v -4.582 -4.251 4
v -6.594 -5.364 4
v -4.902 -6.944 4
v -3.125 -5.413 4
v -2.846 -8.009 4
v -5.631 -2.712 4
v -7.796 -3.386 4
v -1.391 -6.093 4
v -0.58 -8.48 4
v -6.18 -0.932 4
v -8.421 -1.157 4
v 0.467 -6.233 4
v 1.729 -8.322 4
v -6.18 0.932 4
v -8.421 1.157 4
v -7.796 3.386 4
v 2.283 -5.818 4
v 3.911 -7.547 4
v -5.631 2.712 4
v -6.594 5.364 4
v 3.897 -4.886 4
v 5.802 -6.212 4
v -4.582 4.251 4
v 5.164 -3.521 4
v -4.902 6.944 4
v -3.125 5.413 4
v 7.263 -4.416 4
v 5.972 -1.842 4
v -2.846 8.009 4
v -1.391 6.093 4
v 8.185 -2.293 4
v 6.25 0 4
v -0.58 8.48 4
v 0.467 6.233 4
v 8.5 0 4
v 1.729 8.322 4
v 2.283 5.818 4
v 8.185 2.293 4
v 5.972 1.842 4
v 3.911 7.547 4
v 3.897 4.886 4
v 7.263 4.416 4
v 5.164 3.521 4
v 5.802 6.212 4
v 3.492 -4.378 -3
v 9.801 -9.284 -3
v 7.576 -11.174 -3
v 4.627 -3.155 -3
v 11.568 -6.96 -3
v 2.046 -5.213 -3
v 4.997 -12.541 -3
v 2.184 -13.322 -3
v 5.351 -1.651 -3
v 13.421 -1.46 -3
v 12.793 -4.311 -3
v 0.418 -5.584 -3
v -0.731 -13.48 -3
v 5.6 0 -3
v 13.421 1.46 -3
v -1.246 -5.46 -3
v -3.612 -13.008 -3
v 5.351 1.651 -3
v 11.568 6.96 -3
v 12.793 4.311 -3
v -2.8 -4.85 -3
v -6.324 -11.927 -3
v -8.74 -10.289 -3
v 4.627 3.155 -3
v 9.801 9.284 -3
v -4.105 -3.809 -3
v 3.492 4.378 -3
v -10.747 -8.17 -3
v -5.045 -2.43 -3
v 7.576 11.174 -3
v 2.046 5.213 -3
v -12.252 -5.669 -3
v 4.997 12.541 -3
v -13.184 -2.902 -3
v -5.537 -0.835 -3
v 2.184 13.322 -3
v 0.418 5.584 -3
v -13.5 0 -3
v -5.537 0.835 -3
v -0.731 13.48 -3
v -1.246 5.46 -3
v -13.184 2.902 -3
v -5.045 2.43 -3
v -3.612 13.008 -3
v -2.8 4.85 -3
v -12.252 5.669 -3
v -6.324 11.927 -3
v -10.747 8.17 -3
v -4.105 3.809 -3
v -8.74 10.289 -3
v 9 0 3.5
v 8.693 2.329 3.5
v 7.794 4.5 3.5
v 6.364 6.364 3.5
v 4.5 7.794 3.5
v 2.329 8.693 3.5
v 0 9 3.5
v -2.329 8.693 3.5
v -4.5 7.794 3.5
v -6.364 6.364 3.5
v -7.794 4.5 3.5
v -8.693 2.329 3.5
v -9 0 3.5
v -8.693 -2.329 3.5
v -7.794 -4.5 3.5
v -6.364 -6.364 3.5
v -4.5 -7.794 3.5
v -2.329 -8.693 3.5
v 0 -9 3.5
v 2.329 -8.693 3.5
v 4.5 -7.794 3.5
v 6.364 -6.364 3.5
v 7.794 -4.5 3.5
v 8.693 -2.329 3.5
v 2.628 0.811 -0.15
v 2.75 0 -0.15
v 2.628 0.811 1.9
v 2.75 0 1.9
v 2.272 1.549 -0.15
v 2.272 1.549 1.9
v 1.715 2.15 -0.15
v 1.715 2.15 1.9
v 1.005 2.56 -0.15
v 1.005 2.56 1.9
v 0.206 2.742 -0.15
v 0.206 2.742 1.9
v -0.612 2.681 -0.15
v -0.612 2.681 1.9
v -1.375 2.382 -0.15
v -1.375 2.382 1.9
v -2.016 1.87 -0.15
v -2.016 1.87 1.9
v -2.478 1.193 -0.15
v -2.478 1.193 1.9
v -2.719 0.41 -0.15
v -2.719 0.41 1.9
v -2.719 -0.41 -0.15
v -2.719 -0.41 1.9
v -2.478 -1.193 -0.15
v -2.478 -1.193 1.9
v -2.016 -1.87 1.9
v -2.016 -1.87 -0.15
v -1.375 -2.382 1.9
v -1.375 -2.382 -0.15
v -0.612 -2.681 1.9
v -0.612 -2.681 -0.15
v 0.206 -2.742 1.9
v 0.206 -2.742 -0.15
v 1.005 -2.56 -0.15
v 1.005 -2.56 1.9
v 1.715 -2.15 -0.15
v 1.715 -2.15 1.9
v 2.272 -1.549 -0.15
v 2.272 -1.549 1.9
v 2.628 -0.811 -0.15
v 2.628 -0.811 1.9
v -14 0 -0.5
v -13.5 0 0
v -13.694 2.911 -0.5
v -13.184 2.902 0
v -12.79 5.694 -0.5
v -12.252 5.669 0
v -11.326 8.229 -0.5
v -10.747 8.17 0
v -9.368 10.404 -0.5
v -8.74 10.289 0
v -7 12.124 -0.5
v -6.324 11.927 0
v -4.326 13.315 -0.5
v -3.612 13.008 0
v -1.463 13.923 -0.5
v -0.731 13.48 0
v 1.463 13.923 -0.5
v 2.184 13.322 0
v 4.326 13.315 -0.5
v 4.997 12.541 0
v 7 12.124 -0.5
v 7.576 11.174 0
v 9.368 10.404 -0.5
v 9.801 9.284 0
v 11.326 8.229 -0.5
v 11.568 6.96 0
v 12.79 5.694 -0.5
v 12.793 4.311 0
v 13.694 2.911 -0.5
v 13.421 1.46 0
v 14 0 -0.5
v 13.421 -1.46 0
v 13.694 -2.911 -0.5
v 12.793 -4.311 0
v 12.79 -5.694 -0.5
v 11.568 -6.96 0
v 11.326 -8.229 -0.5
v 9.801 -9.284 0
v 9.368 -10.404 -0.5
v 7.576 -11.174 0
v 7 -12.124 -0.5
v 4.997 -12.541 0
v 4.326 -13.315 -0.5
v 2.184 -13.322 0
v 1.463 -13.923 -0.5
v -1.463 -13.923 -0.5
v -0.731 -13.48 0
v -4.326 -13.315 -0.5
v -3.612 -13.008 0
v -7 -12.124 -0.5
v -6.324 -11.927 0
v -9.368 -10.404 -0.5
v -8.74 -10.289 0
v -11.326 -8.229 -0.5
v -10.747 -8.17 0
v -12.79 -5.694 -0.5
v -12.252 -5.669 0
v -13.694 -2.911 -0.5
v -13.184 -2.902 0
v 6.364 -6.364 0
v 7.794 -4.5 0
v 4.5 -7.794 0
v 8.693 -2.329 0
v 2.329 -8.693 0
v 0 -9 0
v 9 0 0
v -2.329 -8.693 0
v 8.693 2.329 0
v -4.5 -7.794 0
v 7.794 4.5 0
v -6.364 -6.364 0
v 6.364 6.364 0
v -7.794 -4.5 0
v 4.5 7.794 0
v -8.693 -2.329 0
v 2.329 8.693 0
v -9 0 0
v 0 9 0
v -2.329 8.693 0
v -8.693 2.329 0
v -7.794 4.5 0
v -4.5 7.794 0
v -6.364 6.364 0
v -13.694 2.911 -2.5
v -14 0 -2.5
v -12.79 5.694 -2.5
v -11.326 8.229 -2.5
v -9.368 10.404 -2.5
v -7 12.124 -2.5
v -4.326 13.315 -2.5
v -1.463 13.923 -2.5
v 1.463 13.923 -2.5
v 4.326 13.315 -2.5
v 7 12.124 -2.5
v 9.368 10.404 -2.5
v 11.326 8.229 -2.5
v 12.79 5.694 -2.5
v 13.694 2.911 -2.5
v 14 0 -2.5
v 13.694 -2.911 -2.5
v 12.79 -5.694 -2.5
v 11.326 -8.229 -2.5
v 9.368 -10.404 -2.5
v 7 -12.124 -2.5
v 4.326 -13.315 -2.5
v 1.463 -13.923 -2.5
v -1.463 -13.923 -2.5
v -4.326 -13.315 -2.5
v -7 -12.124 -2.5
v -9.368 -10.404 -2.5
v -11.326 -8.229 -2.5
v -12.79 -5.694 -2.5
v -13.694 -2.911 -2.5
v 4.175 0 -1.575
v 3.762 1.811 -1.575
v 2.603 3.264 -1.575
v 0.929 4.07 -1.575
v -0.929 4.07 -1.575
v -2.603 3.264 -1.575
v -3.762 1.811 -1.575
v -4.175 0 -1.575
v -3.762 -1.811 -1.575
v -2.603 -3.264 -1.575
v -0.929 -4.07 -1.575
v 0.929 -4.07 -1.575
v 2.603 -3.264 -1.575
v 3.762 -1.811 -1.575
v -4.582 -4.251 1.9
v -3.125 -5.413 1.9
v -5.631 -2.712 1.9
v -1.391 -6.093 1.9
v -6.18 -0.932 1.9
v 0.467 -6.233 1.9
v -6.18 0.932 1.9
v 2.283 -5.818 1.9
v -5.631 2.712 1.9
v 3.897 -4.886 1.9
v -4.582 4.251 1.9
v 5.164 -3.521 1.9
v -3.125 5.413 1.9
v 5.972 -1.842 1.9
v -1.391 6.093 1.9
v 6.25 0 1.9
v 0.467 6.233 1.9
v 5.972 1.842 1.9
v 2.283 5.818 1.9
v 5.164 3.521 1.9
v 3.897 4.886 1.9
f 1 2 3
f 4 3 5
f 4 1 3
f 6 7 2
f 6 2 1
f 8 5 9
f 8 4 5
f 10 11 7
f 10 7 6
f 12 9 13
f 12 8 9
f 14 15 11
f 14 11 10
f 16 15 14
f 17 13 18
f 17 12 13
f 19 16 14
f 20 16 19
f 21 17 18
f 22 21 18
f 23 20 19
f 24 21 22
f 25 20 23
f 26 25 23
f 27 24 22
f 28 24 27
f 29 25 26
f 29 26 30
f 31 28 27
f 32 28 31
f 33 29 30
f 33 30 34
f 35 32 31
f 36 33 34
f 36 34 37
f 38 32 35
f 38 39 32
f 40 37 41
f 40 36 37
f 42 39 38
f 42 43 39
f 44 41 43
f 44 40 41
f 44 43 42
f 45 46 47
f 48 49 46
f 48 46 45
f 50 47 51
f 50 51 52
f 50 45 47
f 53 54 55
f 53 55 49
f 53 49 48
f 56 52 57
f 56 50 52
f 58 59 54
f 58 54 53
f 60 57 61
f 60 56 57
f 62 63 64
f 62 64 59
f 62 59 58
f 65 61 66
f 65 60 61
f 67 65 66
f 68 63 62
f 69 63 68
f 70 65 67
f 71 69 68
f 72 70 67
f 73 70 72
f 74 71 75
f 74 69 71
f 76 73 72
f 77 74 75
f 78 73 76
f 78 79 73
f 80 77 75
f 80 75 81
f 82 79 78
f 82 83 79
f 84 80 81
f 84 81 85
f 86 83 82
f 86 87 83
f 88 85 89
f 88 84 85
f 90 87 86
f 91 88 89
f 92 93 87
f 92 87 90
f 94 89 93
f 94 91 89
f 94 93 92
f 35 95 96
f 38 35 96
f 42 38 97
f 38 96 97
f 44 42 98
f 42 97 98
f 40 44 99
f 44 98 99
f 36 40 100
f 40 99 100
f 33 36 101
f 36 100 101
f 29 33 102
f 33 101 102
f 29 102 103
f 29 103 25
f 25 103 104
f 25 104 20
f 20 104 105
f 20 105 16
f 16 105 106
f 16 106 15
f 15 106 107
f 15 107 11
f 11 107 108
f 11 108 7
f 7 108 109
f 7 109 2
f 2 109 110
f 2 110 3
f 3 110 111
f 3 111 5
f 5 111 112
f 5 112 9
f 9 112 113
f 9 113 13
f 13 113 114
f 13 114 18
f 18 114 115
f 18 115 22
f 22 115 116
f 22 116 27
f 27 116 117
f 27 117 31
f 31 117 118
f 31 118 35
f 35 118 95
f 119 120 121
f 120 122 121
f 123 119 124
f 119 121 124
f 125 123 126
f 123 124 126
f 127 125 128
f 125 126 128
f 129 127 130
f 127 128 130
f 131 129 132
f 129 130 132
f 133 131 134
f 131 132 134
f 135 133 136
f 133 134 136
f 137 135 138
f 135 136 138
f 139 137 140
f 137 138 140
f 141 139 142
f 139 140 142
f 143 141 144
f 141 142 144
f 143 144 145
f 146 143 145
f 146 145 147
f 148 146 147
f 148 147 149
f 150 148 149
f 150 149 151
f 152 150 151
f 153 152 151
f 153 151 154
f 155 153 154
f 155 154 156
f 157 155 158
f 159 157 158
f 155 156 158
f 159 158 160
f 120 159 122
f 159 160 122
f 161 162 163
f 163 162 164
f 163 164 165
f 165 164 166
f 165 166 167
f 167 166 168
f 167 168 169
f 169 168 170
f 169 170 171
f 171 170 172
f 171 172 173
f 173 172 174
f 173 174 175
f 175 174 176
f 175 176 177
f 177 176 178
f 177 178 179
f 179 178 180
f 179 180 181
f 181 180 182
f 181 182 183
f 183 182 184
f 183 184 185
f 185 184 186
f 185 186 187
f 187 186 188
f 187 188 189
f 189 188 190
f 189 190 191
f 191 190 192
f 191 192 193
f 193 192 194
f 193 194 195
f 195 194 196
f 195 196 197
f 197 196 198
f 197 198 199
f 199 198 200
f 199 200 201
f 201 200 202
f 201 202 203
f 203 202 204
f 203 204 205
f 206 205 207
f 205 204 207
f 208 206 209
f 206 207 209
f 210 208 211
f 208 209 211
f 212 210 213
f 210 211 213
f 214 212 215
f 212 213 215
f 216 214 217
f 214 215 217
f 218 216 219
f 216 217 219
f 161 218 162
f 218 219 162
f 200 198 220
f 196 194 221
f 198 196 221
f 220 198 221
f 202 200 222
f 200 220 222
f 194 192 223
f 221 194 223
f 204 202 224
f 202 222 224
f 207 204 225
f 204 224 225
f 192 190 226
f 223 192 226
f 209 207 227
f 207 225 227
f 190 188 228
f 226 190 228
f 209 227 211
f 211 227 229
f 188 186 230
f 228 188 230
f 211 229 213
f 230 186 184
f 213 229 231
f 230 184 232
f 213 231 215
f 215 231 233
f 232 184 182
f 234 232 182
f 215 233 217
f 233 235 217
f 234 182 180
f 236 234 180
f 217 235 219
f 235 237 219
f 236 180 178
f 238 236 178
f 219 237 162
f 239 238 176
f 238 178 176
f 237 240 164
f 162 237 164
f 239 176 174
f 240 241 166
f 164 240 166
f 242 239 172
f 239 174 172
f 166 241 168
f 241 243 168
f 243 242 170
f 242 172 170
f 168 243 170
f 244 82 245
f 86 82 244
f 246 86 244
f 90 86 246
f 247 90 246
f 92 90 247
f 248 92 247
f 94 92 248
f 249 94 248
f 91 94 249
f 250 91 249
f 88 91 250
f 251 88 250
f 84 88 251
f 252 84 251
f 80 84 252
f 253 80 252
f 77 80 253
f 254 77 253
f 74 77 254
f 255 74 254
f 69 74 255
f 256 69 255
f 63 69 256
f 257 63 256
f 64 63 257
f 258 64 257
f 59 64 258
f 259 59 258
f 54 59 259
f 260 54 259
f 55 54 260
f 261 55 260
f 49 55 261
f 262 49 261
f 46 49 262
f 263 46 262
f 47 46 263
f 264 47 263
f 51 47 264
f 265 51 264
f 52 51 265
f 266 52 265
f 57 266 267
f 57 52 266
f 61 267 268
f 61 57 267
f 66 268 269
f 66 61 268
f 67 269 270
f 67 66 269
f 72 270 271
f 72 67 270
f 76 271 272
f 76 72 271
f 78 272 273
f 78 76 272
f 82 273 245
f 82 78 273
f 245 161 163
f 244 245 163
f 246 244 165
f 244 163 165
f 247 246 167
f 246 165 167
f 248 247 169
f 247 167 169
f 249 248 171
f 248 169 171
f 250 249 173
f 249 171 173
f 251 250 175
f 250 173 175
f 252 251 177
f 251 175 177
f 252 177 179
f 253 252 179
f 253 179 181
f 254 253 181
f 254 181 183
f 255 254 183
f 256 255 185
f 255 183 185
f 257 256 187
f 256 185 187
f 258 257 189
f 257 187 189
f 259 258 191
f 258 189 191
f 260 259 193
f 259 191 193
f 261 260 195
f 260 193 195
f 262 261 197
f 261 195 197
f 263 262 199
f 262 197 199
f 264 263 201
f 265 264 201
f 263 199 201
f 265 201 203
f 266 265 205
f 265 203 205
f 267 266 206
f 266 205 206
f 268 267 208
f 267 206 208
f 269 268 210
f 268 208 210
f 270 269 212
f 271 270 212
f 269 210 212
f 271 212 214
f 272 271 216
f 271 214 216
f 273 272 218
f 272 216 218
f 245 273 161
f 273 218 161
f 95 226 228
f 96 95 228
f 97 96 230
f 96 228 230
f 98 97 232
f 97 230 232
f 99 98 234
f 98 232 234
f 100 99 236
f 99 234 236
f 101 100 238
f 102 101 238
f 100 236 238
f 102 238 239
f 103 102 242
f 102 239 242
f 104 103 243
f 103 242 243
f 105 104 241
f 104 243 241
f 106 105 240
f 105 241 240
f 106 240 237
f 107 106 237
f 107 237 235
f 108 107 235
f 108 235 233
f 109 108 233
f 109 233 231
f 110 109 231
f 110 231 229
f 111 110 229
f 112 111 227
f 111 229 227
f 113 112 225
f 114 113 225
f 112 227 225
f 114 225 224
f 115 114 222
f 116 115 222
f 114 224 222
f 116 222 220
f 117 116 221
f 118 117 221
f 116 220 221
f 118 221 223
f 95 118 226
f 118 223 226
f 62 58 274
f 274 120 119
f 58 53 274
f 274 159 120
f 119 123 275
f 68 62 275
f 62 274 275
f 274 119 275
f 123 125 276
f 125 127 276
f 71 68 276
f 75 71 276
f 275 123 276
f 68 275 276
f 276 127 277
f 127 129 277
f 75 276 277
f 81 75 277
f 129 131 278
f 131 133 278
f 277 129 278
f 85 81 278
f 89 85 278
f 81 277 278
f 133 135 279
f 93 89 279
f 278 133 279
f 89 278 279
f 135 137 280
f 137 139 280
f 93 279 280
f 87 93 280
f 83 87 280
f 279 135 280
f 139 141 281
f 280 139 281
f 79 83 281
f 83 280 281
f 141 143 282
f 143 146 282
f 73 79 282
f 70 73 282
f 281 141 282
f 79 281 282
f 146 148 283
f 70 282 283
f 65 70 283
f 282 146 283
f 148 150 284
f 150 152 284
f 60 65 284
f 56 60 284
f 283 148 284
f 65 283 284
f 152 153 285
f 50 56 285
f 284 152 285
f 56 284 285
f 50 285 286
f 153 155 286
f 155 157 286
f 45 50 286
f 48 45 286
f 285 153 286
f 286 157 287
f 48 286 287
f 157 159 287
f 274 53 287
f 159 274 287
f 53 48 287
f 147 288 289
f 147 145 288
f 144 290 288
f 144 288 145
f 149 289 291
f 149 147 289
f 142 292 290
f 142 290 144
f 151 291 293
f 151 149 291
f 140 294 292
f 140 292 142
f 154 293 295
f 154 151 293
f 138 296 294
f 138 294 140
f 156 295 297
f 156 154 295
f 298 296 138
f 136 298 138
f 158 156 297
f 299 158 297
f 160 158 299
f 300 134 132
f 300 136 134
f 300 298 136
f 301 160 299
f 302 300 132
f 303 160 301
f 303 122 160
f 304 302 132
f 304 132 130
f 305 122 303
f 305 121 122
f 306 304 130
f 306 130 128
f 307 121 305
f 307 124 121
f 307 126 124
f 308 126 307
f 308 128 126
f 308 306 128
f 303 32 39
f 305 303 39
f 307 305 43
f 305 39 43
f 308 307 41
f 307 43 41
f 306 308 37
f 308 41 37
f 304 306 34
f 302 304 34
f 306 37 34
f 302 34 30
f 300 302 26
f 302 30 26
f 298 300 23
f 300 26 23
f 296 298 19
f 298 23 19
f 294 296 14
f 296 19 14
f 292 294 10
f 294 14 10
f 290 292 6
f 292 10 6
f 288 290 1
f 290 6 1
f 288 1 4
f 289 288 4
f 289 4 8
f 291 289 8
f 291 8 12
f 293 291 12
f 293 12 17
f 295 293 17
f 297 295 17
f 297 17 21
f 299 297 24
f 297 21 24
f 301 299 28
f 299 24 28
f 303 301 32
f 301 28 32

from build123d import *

# Parameters (mm, degrees)
SKETCH_1_R                = 9
EXTRUDE_1_DEPTH           = 4
SKETCH_2_R                = 14
EXTRUDE_2_DEPTH           = 3
SKETCH_3_R                = 6.25
CUT_EXTRUDE_1_DEPTH       = 2.1
HOLE_WIZARD_1_D           = 5.5
HOLE_WIZARD_1_CSINK_D     = 11.2
HOLE_WIZARD_1_CSINK_ANGLE = 90
CHAMFER_1_SIZE            = 0.5


with BuildPart() as part:
    # 草图1 → 凸台-拉伸1 (new body)
    with BuildSketch(Plane.XY):
        Circle(SKETCH_1_R)
    extrude(amount=EXTRUDE_1_DEPTH)

    # 草图2 → 凸台-拉伸2 (add)
    with BuildSketch(Plane(origin=(0, 0, 0), x_dir=(-1, 0, 0), z_dir=(0, 0, -1))):
        Circle(SKETCH_2_R)
    extrude(amount=EXTRUDE_2_DEPTH)

    # 草图3 → 切除-拉伸1 (cut)
    with BuildSketch(Plane.XY.offset(4)):
        Circle(SKETCH_3_R)
    extrude(amount=-CUT_EXTRUDE_1_DEPTH, mode=Mode.SUBTRACT)

    # 打孔尺寸根据开槽半沉头木螺钉的类型1 (through all)
    with Locations(Plane(origin=(0, 0, -3), x_dir=(-1, 0, 0), z_dir=(0, 0, -1))):
        with Locations((0, 0)):
            CounterSinkHole(HOLE_WIZARD_1_D / 2, HOLE_WIZARD_1_CSINK_D / 2, counter_sink_angle=HOLE_WIZARD_1_CSINK_ANGLE)

    # 倒角1
    chamfer_1_edges = [part.edges().sort_by_distance(p)[0] for p in [
        (-9, 0, 4),
        (14, 0, 0),
        (14, 0, -3),
    ]]
    chamfer(chamfer_1_edges, length=CHAMFER_1_SIZE)


solid = part.part
